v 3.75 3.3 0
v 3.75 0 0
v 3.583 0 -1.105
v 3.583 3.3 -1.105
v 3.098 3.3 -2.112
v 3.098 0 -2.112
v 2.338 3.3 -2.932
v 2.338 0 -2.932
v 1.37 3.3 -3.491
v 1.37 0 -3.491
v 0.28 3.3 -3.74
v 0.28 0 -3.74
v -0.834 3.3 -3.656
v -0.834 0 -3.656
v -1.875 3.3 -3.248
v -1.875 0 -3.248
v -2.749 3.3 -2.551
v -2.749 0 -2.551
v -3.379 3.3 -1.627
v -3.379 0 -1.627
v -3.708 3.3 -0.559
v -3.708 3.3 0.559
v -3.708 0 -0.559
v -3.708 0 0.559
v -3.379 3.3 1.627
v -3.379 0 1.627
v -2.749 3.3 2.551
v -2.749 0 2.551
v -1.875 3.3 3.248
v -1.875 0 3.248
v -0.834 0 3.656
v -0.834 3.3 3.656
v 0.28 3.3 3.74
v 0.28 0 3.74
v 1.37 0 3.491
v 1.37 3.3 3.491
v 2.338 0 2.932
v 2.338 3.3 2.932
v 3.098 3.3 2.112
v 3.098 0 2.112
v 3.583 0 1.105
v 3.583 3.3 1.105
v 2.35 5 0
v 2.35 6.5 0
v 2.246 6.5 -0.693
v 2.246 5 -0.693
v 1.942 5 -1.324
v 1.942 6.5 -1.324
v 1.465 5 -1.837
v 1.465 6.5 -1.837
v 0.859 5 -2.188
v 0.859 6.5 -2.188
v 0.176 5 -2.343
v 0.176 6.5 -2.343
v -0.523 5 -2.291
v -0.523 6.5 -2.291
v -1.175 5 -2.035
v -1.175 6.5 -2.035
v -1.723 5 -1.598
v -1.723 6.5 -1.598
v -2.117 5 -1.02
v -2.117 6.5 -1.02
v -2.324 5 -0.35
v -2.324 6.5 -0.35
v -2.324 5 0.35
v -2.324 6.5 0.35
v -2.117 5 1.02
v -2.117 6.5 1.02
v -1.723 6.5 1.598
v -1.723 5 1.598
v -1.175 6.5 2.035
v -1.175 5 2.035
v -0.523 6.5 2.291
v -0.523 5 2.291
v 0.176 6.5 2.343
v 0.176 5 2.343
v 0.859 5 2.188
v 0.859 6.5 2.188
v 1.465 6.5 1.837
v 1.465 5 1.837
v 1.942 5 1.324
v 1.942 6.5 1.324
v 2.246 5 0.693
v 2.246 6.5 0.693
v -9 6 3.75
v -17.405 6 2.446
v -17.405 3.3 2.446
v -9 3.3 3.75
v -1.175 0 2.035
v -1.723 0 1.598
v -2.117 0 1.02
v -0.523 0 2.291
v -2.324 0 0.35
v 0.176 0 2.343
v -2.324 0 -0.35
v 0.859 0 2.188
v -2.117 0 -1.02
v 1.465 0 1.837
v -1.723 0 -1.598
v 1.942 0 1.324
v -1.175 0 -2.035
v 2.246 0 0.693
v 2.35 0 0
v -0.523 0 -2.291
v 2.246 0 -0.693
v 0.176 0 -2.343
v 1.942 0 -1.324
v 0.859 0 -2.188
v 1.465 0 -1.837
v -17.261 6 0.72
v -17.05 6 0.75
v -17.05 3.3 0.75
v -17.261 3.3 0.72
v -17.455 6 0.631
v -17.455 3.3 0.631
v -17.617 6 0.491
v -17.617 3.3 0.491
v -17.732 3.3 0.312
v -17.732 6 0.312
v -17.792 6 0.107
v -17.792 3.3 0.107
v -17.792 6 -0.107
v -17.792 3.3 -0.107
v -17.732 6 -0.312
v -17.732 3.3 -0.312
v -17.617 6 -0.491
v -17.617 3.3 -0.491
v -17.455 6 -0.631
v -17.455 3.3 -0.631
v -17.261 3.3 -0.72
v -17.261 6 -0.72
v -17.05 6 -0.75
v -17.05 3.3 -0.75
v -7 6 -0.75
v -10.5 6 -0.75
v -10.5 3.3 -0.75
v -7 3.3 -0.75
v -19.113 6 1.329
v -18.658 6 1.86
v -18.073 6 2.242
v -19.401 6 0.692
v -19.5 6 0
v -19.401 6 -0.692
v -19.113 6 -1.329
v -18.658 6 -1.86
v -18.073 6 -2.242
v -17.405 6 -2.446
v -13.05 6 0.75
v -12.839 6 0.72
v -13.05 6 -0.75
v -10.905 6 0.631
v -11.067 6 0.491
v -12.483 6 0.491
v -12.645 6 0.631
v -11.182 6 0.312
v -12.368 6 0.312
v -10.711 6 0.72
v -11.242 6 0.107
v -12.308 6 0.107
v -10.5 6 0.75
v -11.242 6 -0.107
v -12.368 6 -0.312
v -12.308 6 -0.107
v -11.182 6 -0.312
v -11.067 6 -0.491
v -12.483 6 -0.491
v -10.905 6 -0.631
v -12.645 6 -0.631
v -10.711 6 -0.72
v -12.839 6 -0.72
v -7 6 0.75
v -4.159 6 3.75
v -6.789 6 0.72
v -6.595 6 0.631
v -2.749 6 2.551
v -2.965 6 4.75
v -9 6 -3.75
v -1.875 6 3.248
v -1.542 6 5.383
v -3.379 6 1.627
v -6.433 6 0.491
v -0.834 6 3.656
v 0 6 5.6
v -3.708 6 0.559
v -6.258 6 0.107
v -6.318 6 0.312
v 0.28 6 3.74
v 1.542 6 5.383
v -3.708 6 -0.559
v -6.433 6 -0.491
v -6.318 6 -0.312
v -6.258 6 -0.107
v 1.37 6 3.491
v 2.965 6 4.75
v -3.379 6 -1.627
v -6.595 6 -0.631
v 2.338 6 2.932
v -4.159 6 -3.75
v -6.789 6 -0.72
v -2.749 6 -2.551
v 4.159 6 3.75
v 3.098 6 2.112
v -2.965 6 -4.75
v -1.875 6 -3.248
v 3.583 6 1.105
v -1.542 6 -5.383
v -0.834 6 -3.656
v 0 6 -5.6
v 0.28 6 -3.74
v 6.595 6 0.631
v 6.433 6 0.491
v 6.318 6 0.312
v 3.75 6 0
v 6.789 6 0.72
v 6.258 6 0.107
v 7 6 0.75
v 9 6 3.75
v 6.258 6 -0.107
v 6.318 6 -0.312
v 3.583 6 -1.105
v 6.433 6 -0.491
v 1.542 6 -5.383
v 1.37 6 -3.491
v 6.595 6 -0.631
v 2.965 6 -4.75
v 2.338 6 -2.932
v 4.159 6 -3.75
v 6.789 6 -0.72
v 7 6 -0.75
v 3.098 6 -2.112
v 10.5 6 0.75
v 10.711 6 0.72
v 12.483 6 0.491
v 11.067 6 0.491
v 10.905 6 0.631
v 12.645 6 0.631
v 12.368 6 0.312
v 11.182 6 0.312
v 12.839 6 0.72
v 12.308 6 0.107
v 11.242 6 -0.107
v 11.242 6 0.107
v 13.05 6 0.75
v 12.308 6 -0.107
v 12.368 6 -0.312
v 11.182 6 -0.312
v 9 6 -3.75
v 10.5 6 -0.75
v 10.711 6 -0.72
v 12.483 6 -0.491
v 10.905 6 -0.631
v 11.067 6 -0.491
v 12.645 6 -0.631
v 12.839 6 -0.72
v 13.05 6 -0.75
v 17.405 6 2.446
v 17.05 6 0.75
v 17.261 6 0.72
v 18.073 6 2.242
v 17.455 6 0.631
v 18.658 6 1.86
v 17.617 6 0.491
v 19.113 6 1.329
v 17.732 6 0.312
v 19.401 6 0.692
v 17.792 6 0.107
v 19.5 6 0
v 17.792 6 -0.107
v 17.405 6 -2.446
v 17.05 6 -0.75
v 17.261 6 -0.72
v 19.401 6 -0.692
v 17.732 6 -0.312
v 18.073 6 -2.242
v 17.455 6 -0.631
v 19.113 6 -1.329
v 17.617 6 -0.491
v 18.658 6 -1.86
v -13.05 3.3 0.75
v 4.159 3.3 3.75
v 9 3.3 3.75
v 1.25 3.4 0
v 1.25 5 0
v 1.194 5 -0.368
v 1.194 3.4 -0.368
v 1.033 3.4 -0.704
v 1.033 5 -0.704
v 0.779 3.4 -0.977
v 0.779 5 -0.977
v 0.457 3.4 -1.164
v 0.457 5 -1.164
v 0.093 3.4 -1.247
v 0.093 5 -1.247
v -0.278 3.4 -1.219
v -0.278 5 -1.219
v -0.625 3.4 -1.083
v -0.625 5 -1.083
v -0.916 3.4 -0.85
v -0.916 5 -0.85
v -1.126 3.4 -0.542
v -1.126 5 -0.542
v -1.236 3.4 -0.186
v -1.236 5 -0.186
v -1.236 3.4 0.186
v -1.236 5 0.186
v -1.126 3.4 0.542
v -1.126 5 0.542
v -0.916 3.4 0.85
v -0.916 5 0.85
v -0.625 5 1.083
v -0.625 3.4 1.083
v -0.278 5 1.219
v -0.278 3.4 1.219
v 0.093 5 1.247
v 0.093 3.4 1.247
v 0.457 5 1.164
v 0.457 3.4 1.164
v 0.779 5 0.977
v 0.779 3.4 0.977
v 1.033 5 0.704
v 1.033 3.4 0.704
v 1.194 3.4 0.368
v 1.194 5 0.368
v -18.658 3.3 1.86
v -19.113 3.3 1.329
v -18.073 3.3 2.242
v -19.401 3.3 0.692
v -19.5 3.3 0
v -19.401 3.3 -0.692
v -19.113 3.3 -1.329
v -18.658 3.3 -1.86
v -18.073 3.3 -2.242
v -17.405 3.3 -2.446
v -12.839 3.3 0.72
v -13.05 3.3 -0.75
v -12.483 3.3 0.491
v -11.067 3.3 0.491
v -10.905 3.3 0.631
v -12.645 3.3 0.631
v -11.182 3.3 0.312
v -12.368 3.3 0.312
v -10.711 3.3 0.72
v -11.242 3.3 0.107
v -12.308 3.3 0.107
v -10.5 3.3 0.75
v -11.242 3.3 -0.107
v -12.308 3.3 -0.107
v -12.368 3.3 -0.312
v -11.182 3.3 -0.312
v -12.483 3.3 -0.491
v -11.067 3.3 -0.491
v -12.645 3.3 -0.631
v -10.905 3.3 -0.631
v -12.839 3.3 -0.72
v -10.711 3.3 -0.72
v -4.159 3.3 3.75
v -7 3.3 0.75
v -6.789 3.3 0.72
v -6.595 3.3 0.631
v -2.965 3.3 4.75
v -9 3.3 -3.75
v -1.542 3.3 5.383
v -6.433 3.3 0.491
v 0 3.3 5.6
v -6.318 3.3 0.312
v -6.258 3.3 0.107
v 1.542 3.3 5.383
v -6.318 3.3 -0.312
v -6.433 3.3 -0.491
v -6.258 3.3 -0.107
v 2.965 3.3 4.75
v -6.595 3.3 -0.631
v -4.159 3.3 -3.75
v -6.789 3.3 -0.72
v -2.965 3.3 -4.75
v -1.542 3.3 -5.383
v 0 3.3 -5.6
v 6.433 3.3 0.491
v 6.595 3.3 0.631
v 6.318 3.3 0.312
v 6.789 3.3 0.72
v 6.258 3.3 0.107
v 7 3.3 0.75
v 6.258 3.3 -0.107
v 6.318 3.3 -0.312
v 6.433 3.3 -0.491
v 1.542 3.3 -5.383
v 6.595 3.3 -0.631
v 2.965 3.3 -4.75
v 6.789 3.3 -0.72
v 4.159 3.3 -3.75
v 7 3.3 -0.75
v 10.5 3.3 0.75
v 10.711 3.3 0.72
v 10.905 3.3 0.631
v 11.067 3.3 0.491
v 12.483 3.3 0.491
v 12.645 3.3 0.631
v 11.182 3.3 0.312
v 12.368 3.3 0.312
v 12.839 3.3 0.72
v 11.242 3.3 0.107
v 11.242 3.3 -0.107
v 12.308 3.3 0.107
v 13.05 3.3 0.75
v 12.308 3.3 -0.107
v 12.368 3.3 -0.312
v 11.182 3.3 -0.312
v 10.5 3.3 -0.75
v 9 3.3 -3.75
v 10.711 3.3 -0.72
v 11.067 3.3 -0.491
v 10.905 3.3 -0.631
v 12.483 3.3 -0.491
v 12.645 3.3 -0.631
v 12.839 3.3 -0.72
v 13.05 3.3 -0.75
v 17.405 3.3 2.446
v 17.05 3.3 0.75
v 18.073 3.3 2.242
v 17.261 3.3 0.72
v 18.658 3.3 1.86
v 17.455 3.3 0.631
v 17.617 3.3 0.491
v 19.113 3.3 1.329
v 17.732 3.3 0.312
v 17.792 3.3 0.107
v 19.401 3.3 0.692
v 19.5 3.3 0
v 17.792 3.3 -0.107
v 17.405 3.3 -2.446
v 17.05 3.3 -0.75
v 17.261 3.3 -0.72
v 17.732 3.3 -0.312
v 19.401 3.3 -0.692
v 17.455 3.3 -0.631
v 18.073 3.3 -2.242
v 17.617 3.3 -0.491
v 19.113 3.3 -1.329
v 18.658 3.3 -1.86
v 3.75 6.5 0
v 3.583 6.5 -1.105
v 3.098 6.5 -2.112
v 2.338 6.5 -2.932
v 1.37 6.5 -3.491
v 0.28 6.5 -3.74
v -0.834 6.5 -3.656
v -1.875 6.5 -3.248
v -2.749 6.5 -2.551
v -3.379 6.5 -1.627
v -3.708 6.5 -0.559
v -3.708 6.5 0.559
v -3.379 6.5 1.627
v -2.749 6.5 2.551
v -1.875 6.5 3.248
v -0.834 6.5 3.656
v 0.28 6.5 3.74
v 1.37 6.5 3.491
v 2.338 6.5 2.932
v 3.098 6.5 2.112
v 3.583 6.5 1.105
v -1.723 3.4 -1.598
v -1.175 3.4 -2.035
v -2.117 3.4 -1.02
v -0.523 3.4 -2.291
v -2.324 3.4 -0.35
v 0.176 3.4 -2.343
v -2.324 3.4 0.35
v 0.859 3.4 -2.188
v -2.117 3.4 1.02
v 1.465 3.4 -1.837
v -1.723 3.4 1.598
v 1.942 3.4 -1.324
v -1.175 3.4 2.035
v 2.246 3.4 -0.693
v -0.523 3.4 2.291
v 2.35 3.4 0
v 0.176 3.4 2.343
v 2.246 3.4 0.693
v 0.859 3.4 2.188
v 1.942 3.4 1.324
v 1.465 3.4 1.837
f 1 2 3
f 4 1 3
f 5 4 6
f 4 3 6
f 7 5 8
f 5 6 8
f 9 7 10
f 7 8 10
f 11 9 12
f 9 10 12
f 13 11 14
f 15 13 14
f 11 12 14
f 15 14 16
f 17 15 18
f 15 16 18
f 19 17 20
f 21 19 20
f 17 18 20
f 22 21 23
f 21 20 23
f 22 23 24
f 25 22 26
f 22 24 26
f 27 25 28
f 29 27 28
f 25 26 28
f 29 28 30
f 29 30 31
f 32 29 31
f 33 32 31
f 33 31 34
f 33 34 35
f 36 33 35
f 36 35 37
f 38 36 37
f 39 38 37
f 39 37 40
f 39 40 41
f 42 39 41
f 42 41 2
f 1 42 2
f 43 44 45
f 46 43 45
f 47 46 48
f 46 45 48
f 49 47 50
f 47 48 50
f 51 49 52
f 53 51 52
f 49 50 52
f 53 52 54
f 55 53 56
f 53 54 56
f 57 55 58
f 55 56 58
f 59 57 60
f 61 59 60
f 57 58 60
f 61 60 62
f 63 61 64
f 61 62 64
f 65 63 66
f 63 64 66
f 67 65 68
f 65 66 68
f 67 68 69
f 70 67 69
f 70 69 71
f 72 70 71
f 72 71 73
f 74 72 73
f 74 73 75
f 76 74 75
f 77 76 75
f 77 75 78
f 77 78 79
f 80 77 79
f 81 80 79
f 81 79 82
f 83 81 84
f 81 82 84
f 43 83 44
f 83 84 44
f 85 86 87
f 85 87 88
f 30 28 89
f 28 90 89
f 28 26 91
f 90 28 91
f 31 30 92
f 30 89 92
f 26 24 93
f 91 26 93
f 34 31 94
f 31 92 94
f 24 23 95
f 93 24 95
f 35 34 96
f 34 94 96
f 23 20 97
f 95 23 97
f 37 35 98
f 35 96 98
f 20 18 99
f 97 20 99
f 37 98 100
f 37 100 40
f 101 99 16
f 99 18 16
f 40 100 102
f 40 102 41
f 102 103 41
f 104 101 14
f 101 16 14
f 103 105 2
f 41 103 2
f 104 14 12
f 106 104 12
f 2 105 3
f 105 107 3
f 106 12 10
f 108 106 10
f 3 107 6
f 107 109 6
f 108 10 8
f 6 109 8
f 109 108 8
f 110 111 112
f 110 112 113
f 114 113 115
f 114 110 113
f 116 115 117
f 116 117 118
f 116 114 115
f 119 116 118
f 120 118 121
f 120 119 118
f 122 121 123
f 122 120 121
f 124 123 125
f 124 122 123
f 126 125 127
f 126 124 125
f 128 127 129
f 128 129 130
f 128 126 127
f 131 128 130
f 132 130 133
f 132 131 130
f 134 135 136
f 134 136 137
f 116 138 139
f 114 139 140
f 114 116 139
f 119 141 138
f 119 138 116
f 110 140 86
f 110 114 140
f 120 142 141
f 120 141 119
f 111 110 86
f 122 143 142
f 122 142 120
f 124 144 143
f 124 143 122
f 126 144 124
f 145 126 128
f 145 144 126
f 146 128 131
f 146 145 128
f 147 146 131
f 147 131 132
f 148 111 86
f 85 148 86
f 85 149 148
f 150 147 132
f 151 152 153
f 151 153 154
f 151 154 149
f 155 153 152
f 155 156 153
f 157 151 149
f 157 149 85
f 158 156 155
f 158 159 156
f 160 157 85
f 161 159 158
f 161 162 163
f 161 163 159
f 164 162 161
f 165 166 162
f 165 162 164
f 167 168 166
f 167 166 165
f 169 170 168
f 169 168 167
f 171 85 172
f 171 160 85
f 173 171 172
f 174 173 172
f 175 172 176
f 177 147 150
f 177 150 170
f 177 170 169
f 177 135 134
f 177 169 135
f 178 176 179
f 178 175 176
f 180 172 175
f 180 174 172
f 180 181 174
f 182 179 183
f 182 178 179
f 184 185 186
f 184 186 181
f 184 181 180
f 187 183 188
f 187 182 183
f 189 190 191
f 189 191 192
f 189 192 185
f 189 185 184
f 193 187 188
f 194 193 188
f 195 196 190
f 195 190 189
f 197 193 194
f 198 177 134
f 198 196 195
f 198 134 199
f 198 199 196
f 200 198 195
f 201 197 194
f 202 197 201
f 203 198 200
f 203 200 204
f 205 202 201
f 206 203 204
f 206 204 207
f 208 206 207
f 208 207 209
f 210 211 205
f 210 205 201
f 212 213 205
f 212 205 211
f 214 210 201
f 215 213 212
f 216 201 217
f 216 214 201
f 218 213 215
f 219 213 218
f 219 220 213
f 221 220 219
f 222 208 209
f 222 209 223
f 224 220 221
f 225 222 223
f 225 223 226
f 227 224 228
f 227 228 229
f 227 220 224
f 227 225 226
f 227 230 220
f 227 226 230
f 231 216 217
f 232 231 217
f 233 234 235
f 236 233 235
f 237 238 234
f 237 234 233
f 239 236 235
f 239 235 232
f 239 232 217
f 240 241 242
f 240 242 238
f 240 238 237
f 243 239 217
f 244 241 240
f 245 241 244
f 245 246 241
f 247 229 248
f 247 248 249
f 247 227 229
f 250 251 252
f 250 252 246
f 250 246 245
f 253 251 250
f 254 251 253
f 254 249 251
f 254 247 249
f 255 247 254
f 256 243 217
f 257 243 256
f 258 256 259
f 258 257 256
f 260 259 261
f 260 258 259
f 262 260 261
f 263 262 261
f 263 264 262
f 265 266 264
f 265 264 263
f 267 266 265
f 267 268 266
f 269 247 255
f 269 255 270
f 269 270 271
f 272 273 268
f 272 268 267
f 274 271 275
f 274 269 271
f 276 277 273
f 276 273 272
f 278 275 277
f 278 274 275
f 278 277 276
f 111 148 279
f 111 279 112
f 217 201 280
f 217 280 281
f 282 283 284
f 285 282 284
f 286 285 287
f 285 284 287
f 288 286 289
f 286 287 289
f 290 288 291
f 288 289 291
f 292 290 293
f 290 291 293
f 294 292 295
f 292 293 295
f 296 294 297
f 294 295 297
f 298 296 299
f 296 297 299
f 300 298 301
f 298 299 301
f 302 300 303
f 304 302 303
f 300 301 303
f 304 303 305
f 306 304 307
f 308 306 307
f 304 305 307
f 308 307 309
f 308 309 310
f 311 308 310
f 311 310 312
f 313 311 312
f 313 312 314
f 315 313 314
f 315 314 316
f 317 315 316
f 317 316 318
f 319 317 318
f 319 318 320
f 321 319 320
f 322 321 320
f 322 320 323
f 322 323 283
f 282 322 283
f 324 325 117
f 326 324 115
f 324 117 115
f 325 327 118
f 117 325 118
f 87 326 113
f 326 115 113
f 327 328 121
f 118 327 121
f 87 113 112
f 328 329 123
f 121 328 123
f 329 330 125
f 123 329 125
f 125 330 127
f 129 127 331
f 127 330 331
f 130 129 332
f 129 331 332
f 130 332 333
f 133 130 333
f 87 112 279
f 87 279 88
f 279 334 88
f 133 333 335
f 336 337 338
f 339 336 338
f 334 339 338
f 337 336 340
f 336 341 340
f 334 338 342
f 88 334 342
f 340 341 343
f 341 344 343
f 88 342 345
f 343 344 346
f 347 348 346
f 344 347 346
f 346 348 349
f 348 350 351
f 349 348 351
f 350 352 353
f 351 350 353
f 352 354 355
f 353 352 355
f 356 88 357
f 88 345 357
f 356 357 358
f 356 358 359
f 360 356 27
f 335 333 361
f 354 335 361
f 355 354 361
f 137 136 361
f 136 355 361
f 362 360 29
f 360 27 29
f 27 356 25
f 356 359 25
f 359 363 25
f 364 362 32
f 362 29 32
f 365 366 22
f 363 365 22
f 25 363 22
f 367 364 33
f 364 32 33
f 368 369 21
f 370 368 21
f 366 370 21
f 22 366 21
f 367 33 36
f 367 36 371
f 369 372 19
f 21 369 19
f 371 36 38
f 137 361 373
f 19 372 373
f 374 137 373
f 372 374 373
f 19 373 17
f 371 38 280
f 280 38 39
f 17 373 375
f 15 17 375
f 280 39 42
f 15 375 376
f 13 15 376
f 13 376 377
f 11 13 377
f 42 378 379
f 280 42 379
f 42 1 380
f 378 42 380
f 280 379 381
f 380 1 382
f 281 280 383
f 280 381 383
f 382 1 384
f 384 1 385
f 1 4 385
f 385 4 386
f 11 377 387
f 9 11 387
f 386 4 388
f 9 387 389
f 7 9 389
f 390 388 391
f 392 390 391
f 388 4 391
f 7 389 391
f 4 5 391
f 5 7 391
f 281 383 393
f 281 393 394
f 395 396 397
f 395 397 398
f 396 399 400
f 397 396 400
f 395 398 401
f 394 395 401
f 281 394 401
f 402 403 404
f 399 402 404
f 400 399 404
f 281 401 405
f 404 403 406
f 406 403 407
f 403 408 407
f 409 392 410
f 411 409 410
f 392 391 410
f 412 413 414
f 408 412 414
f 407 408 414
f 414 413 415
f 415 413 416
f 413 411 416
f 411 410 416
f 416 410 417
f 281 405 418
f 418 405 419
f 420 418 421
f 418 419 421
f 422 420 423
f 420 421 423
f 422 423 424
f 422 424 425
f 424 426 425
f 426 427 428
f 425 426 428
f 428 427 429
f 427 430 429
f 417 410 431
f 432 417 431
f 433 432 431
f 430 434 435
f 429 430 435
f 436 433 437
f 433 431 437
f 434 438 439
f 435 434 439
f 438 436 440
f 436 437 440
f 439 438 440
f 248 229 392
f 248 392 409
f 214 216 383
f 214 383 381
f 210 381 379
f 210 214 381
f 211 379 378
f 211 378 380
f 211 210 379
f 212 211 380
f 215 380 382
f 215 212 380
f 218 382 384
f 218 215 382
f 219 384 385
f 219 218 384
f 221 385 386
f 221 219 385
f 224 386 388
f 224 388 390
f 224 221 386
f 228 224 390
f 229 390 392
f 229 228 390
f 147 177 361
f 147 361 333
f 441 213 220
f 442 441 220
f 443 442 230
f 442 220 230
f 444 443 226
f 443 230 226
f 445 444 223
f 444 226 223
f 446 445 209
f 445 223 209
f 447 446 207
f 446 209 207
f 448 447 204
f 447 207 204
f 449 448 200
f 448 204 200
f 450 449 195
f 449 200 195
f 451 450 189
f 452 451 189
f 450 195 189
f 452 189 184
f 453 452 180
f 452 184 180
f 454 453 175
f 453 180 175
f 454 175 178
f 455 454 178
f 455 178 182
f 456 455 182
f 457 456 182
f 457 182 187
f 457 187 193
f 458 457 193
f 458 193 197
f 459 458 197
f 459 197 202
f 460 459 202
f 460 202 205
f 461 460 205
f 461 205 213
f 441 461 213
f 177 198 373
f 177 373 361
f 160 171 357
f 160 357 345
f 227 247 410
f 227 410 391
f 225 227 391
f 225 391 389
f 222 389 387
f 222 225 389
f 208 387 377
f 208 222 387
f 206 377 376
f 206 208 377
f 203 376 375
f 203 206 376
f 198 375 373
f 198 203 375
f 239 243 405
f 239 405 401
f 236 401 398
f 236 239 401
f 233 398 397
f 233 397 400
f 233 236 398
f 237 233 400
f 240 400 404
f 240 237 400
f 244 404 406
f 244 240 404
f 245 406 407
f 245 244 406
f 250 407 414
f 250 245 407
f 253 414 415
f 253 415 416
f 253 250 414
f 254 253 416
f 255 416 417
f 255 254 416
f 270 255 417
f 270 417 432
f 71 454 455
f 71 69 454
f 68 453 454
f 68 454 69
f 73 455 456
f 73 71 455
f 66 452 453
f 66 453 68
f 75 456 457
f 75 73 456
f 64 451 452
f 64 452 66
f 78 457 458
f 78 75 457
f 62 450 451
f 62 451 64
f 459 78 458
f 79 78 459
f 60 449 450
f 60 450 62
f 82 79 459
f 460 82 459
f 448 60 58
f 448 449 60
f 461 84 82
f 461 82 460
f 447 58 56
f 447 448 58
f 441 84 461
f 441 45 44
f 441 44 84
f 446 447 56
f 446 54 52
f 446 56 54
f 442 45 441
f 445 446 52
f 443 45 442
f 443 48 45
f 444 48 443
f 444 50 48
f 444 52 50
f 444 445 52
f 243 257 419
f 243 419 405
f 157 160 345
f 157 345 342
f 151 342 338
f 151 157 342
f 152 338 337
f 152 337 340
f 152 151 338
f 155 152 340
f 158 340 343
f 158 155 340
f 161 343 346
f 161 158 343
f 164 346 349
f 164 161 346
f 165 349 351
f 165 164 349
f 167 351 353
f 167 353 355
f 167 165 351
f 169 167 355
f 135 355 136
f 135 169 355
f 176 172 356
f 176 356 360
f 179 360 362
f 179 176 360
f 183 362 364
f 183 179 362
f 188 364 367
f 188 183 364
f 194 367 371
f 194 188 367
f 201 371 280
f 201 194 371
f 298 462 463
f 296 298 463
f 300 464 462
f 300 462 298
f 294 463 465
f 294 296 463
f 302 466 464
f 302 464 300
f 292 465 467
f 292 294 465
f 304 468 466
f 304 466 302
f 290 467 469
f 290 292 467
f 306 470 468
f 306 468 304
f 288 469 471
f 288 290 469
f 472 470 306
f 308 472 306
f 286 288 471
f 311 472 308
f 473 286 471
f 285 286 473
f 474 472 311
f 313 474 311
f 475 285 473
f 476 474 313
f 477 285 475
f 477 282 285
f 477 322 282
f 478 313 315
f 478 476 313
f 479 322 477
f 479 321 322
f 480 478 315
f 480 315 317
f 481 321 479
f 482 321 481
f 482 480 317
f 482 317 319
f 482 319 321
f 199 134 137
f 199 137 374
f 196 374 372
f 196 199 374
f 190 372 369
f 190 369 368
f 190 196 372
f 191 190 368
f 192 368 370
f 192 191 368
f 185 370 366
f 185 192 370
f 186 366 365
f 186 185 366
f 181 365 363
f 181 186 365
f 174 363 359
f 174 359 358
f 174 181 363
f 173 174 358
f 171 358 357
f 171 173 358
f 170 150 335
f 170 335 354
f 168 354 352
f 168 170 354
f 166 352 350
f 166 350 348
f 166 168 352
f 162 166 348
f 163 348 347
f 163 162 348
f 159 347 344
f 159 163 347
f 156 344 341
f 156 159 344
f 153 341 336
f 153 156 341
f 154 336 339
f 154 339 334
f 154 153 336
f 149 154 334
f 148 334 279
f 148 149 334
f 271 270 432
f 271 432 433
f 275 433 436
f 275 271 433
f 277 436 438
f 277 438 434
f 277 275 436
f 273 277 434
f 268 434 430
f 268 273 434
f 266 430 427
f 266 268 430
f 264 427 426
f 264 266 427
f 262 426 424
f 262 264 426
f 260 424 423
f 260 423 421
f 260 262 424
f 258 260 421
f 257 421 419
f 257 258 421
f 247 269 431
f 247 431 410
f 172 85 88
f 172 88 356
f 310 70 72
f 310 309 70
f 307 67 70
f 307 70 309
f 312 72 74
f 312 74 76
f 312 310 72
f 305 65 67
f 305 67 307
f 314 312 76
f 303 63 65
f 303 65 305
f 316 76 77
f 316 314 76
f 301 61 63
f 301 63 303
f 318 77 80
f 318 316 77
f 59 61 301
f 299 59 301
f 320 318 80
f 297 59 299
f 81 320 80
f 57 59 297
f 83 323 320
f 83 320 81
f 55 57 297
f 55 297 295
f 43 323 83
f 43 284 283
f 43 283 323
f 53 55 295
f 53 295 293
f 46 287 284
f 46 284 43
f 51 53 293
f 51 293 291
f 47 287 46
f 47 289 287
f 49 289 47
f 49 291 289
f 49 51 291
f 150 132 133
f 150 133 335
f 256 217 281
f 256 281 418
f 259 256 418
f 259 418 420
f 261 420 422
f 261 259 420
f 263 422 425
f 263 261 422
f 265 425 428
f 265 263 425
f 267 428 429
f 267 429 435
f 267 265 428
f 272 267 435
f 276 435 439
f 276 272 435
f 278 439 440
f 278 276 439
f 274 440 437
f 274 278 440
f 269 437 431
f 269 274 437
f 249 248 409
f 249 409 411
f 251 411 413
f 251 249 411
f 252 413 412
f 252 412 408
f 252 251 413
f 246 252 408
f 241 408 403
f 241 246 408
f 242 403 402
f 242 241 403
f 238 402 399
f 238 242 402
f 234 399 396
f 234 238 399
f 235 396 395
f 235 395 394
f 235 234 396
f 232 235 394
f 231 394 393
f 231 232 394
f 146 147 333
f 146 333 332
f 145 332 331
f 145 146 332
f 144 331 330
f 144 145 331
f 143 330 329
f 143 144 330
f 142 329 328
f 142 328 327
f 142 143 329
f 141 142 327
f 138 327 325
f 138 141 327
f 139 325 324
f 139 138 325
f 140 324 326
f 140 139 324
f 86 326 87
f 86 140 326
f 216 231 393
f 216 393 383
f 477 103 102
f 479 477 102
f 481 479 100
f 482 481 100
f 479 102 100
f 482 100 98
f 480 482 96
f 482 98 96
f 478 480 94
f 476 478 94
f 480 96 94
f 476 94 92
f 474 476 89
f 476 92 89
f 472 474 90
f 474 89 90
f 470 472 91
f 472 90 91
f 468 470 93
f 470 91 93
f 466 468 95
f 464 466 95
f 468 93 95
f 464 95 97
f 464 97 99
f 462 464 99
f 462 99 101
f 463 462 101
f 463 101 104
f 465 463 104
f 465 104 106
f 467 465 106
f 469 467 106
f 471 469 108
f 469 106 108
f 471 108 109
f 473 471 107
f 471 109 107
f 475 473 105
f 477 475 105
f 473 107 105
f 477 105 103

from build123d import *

# Parameters (mm, degrees)
SKETCH2_R               = 3.75
BOSS_EXTRUDE1_DEPTH     = 6.5
SKETCH3_R               = 1.25
CUT_EXTRUDE1_DEPTH      = 1
CUT_EXTRUDE1_DEPTH_BACK = 7.5
SKETCH4_R               = 2.35
CUT_EXTRUDE2_DEPTH      = 1
CUT_EXTRUDE2_DEPTH_BACK = 1.5
SKETCH7_R               = 2.35
CUT_EXTRUDE5_DEPTH      = 3.4
SKETCH8_R               = 3.75
BOSS_EXTRUDE4_DEPTH     = 2.7


with BuildPart() as part:
    # Sketch2 → Boss-Extrude1 (new body)
    with BuildSketch(Plane(origin=(0, 0, 0), x_dir=(1, 0, 0), z_dir=(0, 1, 0))):
        Circle(SKETCH2_R)
    extrude(amount=BOSS_EXTRUDE1_DEPTH)

    # Sketch3 → Cut-Extrude1 (cut, two sides)
    with BuildSketch(Plane(origin=(0, 6.5, 0), x_dir=(1, 0, 0), z_dir=(0, 1, 0))) as cut_extrude1_sk:
        Circle(SKETCH3_R)
    extrude(amount=CUT_EXTRUDE1_DEPTH, mode=Mode.SUBTRACT)
    extrude(cut_extrude1_sk.sketch, amount=-CUT_EXTRUDE1_DEPTH_BACK, mode=Mode.SUBTRACT)

    # Sketch4 → Cut-Extrude2 (cut, two sides)
    with BuildSketch(Plane(origin=(0, 6.5, 0), x_dir=(1, 0, 0), z_dir=(0, 1, 0))) as cut_extrude2_sk:
        Circle(SKETCH4_R)
    extrude(amount=CUT_EXTRUDE2_DEPTH, mode=Mode.SUBTRACT)
    extrude(cut_extrude2_sk.sketch, amount=-CUT_EXTRUDE2_DEPTH_BACK, mode=Mode.SUBTRACT)

    # Sketch7 → Cut-Extrude5 (cut)
    with BuildSketch(Plane.XZ):
        Circle(SKETCH7_R)
    extrude(amount=-CUT_EXTRUDE5_DEPTH, mode=Mode.SUBTRACT)

    # Sketch8 → Boss-Extrude4 (add)
    with BuildSketch(Plane(origin=(0, 6, 0), x_dir=(1, 0, 0), z_dir=(0, 1, 0))):
        with BuildLine():
            Line((-9, -3.75), (-4.159026328, -3.75))
            ThreePointArc((-4.159026328, -3.75), (0, -5.6), (4.159026328, -3.75))
            Line((4.159026328, -3.75), (9, -3.75))
            Line((9, -3.75), (17.404544417, -2.445725053))
            ThreePointArc((17.404544417, -2.445725053), (19.5, 0), (17.404544417, 2.445725053))
            Line((17.404544417, 2.445725053), (9, 3.75))
            Line((9, 3.75), (4.159026328, 3.75))
            ThreePointArc((4.159026328, 3.75), (0, 5.6), (-4.159026328, 3.75))
            Line((-4.159026328, 3.75), (-9, 3.75))
            Line((-9, 3.75), (-17.404544417, 2.445725053))
            ThreePointArc((-17.404544417, 2.445725053), (-19.5, 0), (-17.404544417, -2.445725053))
            Line((-17.404544417, -2.445725053), (-9, -3.75))
        make_face()
        with BuildLine():
            ThreePointArc((-13.05, 0.75), (-12.3, 0), (-13.05, -0.75))
            Line((-13.05, -0.75), (-17.05, -0.75))
            ThreePointArc((-17.05, -0.75), (-17.8, 0), (-17.05, 0.75))
            Line((-17.05, 0.75), (-13.05, 0.75))
        make_face(mode=Mode.SUBTRACT)
        with BuildLine():
            ThreePointArc((-7, 0.75), (-6.25, 0), (-7, -0.75))
            Line((-7, -0.75), (-10.5, -0.75))
            ThreePointArc((-10.5, -0.75), (-11.25, 0), (-10.5, 0.75))
            Line((-10.5, 0.75), (-7, 0.75))
        make_face(mode=Mode.SUBTRACT)
        Circle(SKETCH8_R, mode=Mode.SUBTRACT)
        with BuildLine():
            ThreePointArc((7, -0.75), (6.25, 0), (7, 0.75))
            Line((7, 0.75), (10.5, 0.75))
            ThreePointArc((10.5, 0.75), (11.25, 0), (10.5, -0.75))
            Line((10.5, -0.75), (7, -0.75))
        make_face(mode=Mode.SUBTRACT)
        with BuildLine():
            ThreePointArc((17.05, 0.75), (17.8, 0), (17.05, -0.75))
            Line((17.05, -0.75), (13.05, -0.75))
            ThreePointArc((13.05, -0.75), (12.3, 0), (13.05, 0.75))
            Line((13.05, 0.75), (17.05, 0.75))
        make_face(mode=Mode.SUBTRACT)
    extrude(amount=-BOSS_EXTRUDE4_DEPTH)


solid = part.part
